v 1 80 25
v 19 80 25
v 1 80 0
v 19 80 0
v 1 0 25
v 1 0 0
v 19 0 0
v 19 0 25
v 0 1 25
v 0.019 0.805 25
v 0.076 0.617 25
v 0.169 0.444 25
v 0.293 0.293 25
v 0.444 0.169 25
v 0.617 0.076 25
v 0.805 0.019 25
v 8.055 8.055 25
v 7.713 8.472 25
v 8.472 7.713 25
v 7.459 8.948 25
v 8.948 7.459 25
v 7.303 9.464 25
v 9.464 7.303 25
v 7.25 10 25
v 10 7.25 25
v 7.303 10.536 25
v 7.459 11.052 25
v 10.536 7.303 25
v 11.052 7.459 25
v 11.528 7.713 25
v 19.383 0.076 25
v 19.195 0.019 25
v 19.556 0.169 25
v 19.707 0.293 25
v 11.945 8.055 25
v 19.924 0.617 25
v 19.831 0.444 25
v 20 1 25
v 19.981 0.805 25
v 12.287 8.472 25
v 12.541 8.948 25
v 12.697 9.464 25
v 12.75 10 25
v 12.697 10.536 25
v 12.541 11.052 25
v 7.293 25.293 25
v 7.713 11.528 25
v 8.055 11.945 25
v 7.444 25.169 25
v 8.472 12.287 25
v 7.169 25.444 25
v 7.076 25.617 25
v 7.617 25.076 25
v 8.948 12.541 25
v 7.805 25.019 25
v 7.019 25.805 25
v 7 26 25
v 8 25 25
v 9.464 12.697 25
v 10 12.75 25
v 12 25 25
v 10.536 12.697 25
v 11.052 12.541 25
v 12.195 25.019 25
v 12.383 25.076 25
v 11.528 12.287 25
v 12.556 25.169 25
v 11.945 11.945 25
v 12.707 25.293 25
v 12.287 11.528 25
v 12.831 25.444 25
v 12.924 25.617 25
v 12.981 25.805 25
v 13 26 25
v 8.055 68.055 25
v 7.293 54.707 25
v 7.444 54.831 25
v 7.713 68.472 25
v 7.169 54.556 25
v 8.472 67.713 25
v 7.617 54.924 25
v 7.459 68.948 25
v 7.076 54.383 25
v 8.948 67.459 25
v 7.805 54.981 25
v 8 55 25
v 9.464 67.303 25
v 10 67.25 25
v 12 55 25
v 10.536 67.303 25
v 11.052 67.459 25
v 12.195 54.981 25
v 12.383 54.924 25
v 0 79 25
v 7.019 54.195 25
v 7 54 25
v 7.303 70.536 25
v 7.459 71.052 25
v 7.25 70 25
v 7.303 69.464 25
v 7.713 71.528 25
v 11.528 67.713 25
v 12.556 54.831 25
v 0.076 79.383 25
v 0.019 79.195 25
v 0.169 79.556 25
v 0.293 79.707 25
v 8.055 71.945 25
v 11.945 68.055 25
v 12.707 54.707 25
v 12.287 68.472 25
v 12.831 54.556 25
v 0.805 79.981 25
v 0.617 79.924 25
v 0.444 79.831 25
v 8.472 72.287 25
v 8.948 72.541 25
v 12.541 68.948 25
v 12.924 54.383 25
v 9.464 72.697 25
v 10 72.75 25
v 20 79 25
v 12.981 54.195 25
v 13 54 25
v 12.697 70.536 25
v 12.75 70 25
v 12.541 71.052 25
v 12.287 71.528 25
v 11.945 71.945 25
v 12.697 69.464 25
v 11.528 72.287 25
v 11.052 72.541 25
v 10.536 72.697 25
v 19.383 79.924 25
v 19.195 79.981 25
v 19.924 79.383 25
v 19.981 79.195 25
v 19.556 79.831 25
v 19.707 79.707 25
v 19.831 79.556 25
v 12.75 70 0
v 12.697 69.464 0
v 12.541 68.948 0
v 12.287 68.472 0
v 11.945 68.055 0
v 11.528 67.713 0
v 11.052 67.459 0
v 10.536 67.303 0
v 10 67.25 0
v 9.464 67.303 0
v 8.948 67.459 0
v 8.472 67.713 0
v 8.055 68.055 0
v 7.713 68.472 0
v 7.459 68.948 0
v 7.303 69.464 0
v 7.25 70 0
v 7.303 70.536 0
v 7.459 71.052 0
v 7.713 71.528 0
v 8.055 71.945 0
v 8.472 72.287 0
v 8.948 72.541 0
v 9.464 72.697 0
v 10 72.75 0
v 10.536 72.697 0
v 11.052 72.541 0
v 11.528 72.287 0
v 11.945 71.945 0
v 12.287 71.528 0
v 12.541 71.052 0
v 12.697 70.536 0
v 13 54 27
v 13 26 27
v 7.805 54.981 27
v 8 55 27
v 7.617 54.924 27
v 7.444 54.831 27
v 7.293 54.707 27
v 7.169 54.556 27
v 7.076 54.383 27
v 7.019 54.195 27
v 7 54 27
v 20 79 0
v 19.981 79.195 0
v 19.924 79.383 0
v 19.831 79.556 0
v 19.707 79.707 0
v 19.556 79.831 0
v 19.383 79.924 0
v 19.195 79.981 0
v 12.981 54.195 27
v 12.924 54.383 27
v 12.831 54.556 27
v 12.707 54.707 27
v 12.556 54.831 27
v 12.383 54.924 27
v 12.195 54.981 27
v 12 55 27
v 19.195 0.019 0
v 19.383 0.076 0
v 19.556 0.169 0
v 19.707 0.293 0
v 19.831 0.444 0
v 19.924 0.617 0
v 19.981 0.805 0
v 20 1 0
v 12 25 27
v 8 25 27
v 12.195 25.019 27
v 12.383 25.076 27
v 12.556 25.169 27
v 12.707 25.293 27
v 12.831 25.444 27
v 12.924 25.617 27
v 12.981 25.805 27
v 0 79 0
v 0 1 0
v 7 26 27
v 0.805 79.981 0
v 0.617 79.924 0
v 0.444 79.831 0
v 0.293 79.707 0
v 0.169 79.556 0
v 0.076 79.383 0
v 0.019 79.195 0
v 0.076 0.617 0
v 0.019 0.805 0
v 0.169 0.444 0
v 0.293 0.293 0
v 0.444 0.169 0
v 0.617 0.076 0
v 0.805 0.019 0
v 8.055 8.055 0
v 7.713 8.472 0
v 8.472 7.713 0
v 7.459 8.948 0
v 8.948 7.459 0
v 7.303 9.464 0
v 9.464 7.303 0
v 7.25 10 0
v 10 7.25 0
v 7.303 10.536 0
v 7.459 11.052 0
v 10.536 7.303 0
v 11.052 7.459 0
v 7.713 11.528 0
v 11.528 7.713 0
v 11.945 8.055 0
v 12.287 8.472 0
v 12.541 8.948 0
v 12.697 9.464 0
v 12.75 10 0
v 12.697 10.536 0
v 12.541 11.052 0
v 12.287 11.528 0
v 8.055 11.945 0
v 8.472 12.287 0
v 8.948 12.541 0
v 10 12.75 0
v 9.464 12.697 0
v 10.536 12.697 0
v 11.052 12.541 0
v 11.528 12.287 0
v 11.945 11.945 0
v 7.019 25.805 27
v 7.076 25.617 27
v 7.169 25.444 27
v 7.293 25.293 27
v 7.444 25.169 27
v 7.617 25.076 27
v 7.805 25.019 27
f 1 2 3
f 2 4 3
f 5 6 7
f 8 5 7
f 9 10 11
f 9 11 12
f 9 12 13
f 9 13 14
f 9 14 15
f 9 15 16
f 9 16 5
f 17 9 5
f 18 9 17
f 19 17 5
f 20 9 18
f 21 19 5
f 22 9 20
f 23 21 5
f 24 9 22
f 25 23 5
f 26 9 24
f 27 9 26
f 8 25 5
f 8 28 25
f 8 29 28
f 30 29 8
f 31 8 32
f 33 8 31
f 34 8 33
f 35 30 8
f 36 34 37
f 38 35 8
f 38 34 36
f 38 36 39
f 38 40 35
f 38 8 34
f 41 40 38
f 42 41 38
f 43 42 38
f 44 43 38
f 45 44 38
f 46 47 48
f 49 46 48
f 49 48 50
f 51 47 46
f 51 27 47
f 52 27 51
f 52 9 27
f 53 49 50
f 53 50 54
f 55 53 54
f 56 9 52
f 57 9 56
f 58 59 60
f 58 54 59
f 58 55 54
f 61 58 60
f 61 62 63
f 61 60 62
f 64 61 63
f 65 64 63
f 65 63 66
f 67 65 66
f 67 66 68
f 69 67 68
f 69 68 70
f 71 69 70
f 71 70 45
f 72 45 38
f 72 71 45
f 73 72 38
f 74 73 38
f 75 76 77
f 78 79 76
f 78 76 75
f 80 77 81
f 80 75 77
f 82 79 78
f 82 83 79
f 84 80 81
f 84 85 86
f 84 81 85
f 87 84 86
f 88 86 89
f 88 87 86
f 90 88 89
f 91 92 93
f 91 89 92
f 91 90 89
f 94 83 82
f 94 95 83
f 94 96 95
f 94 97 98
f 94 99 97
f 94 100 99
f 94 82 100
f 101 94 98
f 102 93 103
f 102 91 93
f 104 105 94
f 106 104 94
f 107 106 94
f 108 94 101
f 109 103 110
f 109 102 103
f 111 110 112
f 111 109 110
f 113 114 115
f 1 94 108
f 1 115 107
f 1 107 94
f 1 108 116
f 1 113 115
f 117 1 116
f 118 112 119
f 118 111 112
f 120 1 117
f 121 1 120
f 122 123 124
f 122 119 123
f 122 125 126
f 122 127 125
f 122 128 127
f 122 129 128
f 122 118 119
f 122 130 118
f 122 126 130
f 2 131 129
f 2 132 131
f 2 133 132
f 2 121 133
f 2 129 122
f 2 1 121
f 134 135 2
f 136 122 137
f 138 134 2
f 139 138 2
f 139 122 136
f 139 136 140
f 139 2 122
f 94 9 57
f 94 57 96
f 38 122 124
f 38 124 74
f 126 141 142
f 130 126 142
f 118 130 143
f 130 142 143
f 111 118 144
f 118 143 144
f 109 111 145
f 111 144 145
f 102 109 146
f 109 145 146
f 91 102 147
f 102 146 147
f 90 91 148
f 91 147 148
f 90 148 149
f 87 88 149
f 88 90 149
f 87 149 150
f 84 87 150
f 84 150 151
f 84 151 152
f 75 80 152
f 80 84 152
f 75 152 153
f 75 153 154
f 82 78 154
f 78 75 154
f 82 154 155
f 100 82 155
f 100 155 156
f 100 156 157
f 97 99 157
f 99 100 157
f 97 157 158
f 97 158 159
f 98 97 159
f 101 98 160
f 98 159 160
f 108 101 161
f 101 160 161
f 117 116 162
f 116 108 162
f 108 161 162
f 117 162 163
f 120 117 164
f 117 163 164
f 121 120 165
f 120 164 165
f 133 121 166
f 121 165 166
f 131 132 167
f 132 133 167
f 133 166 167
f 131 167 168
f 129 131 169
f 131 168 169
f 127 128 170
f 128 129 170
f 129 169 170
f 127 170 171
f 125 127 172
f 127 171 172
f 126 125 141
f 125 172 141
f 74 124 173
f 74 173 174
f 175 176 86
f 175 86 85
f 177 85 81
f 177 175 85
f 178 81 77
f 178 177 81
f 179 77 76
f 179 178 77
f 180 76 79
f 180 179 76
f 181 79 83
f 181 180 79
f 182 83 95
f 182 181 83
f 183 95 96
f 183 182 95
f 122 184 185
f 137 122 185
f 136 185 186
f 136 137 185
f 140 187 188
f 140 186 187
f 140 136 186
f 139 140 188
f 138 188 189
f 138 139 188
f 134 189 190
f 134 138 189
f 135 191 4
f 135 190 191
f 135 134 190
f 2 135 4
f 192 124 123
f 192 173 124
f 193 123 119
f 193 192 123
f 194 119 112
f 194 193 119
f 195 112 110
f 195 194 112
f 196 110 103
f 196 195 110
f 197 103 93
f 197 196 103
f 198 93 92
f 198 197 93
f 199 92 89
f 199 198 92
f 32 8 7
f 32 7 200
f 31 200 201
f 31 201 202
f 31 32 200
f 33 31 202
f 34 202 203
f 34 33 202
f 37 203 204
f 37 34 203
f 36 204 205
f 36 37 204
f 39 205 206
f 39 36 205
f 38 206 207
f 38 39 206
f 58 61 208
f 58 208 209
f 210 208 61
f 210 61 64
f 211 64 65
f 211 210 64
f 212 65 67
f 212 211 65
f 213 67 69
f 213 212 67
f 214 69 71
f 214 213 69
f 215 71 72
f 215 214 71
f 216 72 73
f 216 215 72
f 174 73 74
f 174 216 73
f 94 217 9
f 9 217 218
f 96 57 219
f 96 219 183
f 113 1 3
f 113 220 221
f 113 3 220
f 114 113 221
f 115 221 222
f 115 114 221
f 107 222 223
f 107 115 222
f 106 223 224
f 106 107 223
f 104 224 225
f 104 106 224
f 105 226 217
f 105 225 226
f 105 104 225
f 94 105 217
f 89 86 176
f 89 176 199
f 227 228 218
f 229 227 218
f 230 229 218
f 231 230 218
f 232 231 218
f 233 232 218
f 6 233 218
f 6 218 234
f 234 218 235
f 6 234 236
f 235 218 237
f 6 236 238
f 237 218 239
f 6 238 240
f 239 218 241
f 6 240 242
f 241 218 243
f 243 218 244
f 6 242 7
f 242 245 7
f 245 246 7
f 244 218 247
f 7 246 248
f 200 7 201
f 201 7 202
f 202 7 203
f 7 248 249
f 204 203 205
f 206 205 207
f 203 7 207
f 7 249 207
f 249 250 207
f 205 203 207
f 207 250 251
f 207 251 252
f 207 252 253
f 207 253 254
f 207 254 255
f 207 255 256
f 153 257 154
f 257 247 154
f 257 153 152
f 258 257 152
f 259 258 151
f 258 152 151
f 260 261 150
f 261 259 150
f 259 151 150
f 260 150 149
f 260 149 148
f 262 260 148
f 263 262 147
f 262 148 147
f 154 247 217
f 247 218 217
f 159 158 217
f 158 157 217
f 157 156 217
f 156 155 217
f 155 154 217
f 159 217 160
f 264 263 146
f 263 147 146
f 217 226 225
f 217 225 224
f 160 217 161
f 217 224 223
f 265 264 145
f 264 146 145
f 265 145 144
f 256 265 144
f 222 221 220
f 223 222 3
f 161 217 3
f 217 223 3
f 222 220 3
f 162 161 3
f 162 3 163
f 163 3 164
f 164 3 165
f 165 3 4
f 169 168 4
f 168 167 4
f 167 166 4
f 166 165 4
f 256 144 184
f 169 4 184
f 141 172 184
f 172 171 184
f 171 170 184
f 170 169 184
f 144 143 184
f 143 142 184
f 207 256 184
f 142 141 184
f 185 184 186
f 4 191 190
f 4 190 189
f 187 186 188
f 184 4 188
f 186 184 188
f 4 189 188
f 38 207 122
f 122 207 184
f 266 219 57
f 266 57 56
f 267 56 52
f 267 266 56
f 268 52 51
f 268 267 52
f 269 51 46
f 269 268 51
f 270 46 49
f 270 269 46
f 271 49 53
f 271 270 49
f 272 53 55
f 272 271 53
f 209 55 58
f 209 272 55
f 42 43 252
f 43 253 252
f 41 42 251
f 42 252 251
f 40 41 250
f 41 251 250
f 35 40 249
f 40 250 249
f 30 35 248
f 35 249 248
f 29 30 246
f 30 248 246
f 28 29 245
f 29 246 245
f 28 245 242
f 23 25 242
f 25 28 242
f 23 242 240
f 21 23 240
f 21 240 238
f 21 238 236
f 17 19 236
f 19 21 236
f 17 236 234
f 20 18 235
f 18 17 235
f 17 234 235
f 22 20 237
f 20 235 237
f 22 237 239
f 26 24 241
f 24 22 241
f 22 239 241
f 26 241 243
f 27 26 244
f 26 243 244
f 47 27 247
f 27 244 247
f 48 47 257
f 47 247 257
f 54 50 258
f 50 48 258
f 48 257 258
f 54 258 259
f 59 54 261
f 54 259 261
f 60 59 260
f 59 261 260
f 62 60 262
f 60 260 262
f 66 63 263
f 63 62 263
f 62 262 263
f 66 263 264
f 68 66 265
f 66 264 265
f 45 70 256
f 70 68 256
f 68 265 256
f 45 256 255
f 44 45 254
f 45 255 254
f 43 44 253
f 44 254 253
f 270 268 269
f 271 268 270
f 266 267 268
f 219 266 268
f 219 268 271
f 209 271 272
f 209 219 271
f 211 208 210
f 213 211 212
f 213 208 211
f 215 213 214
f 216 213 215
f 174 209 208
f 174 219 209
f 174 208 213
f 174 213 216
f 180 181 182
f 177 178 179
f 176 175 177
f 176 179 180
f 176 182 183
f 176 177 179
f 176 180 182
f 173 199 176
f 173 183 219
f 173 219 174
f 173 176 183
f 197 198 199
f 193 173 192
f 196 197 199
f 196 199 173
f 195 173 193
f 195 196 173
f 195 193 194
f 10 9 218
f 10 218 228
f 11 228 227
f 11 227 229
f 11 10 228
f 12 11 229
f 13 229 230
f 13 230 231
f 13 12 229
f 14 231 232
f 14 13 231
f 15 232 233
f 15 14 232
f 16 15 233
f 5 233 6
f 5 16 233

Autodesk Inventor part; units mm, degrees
ref_plane "YZ Plane" through (0, 0, 0) normal (1, 0, 0) x (0, 1, 0)
ref_plane "XZ Plane" through (0, 0, 0) normal (0, 1, 0) x (-1, 0, 0)
ref_plane "XY Plane" through (0, 0, 0) normal (0, 0, 1) x (1, 0, 0)
sketch "スケッチ2" plane through (0, 0, 0) normal (0, 0, 1) x (1, 0, 0)
  line L0 (0, 0) -> (20, 0)
  line L1 (20, 0) -> (20, 80)
  line L2 (20, 80) -> (0, 80)
  line L3 (0, 80) -> (0, 0)
  line L4 (10, 80) -> (10, 0) construction
  circle A0 centre (10, 70) radius 2.75
  circle A1 centre (10, 10) radius 2.75
  dimension "d4" = 20
  dimension "d5" = 80
  dimension "d15" = 10
  dimension "d16" = 10
  dimension "d17" = 5.5
extrude "押し出し2" add sketch "スケッチ2" along normal blind 25
sketch "スケッチ4" plane through (0, 0, 25) normal (0, 0, 1) x (1, 0, 0)
  line L0 (0, 0) -> (20, 0) construction
  line L1 (10, 0) -> (10, 80) construction
  line L2 (20, 80) -> (0, 80) construction
  line L3 (0, 80) -> (0, 0) construction
  line L4 (0, 40) -> (20, 40) construction
  line L5 (20, 0) -> (20, 80) construction
  line L6 (13, 25) -> (7, 25)
  line L7 (7, 25) -> (7, 55)
  line L8 (7, 55) -> (13, 55)
  line L9 (13, 55) -> (13, 25)
  line L10 (13, 25) -> (7, 55) construction
  line L11 (7, 25) -> (13, 55) construction
  point P0 (10, 40)
  dimension "d18" = 6
  dimension "d19" = 30
extrude "押し出し4" add sketch "スケッチ4" along normal blind 2
fillet "フィレット1" radius 1 8 edges at (13, 25, 26) (13, 55, 26) (7, 55, 26) (7, 25, 26) (0, 0, 12.5) (20, 0, 12.5) (20, 80, 12.5) (0, 80, 12.5)
properties part number "モータースペーサ"
